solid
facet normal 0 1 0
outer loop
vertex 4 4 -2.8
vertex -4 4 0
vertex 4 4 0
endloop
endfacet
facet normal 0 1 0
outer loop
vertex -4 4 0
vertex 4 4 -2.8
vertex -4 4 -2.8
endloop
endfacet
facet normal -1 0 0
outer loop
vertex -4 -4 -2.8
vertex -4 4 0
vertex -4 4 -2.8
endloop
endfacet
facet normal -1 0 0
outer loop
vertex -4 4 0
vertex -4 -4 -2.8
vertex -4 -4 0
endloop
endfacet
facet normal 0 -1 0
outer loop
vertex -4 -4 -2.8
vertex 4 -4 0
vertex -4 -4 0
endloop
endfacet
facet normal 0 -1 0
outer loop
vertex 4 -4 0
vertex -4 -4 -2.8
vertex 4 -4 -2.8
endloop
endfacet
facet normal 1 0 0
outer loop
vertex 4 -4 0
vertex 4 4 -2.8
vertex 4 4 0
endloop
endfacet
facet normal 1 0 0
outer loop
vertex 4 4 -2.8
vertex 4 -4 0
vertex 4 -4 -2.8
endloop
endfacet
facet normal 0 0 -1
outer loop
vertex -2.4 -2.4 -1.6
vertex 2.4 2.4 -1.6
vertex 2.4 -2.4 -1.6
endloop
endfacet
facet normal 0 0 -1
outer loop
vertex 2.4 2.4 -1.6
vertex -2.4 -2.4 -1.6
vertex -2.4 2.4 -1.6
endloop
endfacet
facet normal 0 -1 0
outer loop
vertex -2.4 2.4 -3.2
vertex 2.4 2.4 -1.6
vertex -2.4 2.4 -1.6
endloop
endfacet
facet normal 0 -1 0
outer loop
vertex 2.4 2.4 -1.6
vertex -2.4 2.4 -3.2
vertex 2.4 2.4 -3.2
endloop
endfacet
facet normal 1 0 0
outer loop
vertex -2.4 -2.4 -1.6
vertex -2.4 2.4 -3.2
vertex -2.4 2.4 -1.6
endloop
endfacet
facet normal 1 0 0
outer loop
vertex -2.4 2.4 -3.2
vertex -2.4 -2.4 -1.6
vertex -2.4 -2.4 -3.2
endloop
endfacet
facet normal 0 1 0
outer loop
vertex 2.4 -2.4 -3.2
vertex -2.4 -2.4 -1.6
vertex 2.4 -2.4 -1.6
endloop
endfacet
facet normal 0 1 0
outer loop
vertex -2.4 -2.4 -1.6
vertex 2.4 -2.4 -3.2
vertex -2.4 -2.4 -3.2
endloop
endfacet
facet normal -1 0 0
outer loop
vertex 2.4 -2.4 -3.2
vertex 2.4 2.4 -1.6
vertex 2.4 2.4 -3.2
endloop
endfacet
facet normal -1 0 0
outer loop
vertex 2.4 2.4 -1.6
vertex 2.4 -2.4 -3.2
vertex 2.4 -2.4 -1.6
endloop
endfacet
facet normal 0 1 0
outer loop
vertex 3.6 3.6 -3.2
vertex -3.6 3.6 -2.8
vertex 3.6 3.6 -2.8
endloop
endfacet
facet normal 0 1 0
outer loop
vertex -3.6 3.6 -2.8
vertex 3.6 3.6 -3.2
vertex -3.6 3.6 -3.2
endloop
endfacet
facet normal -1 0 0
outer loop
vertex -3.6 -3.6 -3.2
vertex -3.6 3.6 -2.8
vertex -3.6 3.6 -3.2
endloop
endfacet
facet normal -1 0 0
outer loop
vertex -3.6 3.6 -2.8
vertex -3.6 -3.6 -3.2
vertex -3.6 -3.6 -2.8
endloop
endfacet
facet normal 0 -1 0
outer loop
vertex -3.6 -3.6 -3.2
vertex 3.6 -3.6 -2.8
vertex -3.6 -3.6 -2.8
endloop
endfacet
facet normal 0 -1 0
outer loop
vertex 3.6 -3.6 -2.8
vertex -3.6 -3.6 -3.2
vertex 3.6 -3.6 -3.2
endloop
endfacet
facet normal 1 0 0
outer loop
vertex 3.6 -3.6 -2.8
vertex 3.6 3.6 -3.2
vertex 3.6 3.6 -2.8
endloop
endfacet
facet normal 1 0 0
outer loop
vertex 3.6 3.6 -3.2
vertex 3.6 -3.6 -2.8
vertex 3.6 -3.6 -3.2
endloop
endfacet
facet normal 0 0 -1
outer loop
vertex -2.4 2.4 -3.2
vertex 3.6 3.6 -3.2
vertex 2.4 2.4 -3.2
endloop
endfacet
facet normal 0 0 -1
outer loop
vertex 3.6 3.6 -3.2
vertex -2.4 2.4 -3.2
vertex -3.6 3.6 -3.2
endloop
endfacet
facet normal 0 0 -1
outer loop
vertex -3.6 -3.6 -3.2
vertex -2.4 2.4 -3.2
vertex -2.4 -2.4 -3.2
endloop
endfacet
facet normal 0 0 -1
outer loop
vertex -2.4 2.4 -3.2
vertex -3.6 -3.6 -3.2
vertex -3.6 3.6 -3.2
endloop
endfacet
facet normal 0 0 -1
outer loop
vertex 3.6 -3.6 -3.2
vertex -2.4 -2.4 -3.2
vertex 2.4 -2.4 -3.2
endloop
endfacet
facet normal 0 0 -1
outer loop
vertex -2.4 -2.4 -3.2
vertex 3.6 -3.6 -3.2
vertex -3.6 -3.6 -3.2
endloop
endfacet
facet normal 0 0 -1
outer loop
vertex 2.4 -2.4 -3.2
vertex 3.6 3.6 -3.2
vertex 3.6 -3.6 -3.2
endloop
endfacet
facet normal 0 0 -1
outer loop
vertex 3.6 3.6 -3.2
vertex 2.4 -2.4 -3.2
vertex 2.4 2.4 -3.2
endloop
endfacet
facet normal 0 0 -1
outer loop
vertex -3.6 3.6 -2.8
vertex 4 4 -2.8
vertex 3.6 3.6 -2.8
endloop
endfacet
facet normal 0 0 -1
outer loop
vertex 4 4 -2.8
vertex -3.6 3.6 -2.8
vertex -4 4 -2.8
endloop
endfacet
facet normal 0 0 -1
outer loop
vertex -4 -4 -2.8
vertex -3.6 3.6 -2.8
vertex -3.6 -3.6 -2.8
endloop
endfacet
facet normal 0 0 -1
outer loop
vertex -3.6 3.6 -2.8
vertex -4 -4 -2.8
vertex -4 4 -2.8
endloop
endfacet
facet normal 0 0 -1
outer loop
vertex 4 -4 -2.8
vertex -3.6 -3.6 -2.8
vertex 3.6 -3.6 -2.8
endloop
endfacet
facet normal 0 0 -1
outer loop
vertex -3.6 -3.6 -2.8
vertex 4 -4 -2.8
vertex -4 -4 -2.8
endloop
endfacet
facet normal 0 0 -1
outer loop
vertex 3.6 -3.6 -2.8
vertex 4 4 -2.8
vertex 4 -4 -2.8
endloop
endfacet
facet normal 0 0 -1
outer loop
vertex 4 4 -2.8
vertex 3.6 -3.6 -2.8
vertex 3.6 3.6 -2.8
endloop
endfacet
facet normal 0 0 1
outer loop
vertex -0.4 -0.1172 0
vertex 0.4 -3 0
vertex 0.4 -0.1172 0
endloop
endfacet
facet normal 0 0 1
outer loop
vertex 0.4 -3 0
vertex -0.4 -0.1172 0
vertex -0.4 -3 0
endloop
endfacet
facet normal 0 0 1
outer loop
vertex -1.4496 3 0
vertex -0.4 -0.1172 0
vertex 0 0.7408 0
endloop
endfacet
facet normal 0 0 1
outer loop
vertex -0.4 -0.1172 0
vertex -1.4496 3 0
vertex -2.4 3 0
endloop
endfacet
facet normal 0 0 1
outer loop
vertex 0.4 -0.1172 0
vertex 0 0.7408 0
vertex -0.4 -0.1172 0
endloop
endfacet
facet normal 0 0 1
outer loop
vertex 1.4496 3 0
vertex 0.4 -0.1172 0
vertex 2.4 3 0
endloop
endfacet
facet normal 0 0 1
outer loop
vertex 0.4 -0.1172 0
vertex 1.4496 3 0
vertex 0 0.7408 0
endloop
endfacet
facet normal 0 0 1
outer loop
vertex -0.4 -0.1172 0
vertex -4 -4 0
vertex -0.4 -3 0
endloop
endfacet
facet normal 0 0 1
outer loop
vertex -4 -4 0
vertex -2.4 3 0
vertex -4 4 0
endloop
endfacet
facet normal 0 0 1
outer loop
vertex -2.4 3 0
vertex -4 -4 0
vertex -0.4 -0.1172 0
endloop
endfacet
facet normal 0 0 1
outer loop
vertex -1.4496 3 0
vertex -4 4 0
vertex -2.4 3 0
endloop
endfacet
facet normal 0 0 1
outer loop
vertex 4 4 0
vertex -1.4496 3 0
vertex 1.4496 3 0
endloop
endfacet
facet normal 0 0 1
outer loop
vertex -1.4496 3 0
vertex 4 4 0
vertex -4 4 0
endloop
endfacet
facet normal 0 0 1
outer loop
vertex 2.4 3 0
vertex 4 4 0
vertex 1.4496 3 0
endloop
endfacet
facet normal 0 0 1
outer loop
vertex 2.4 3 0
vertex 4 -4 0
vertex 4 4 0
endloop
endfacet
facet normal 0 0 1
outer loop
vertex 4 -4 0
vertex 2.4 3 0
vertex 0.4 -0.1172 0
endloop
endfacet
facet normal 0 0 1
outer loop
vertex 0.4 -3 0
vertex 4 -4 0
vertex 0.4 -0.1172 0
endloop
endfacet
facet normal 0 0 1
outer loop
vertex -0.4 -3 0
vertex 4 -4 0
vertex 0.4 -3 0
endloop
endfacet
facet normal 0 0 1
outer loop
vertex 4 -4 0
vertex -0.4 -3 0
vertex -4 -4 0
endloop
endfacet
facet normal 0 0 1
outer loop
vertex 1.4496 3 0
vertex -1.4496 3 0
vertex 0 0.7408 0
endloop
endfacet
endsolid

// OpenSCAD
// file: ../p/box5.scad
use <../lib.scad>
function ldraw_lib__box5() = [
// 0 Box with 5 Faces and All Edges
// 0 Name: box5.dat
// 0 Author: James Jessiman
// 0 !LDRAW_ORG Primitive UPDATE 2012-01
// 0 !LICENSE Licensed under CC BY 2.0 and CC BY 4.0 : see CAreadme.txt
// 
// 0 BFC CERTIFY CCW
  [0,"BFC","CERTIFY"],
  [0,"BFC","CCW"],
// 
// 0 !HISTORY 2002-04-03 [sbliss] Modified for BFC compliance
// 0 !HISTORY 2002-04-25 [PTadmin] Official Update 2002-02
// 0 !HISTORY 2007-06-24 [PTadmin] Header formatted for Contributor Agreement
// 0 !HISTORY 2008-07-01 [PTadmin] Official Update 2008-01
// 0 !HISTORY 2012-02-16 [Philo] Changed to CCW
// 0 !HISTORY 2012-03-30 [PTadmin] Official Update 2012-01
// 
// 
// 2 24 1 1 1 -1 1 1
  [2,24,1,1,1,-1,1,1],
// 2 24 -1 1 1 -1 1 -1
  [2,24,-1,1,1,-1,1,-1],
// 2 24 -1 1 -1 1 1 -1
  [2,24,-1,1,-1,1,1,-1],
// 2 24 1 1 -1 1 1 1
  [2,24,1,1,-1,1,1,1],
// 2 24 1 0 1 -1 0 1
  [2,24,1,0,1,-1,0,1],
// 2 24 -1 0 1 -1 0 -1
  [2,24,-1,0,1,-1,0,-1],
// 2 24 -1 0 -1 1 0 -1
  [2,24,-1,0,-1,1,0,-1],
// 2 24 1 0 -1 1 0 1
  [2,24,1,0,-1,1,0,1],
// 2 24 1 0 1 1 1 1
  [2,24,1,0,1,1,1,1],
// 2 24 -1 0 1 -1 1 1
  [2,24,-1,0,1,-1,1,1],
// 2 24 1 0 -1 1 1 -1
  [2,24,1,0,-1,1,1,-1],
// 2 24 -1 0 -1 -1 1 -1
  [2,24,-1,0,-1,-1,1,-1],
// 4 16 -1 1 1 1 1 1 1 1 -1 -1 1 -1
  [4,16,-1,1,1,1,1,1,1,1,-1,-1,1,-1],
// 4 16 -1 1 1 -1 0 1 1 0 1 1 1 1
  [4,16,-1,1,1,-1,0,1,1,0,1,1,1,1],
// 4 16 -1 1 -1 -1 0 -1 -1 0 1 -1 1 1
  [4,16,-1,1,-1,-1,0,-1,-1,0,1,-1,1,1],
// 4 16 1 1 -1 1 0 -1 -1 0 -1 -1 1 -1
  [4,16,1,1,-1,1,0,-1,-1,0,-1,-1,1,-1],
// 4 16 1 1 1 1 0 1 1 0 -1 1 1 -1
  [4,16,1,1,1,1,0,1,1,0,-1,1,1,-1],
];
makepoly(ldraw_lib__box5(), line=0.2);
// file: ../p/box4.scad
use <../lib.scad>
function ldraw_lib__box4() = [
// 0 Box with 4 Faces (2 Parallel Pairs) and All Edges
// 0 Name: box4.dat
// 0 Author: James Jessiman
// 0 !LDRAW_ORG Primitive UPDATE 2012-01
// 0 !LICENSE Licensed under CC BY 2.0 and CC BY 4.0 : see CAreadme.txt
// 
// 0 BFC CERTIFY CCW
  [0,"BFC","CERTIFY"],
  [0,"BFC","CCW"],
// 
// 0 !HISTORY 2002-04-03 [sbliss] Modified for BFC compliance
// 0 !HISTORY 2002-04-25 [PTadmin] Official Update 2002-02
// 0 !HISTORY 2007-06-24 [PTadmin] Header formatted for Contributor Agreement
// 0 !HISTORY 2008-07-01 [PTadmin] Official Update 2008-01
// 0 !HISTORY 2012-02-16 [Philo] Changed to CCW
// 0 !HISTORY 2012-03-30 [PTadmin] Official Update 2012-01
// 
// 
// 2 24 1 1 1 -1 1 1
  [2,24,1,1,1,-1,1,1],
// 2 24 -1 1 1 -1 1 -1
  [2,24,-1,1,1,-1,1,-1],
// 2 24 -1 1 -1 1 1 -1
  [2,24,-1,1,-1,1,1,-1],
// 2 24 1 1 -1 1 1 1
  [2,24,1,1,-1,1,1,1],
// 2 24 1 0 1 -1 0 1
  [2,24,1,0,1,-1,0,1],
// 2 24 -1 0 1 -1 0 -1
  [2,24,-1,0,1,-1,0,-1],
// 2 24 -1 0 -1 1 0 -1
  [2,24,-1,0,-1,1,0,-1],
// 2 24 1 0 -1 1 0 1
  [2,24,1,0,-1,1,0,1],
// 2 24 1 0 1 1 1 1
  [2,24,1,0,1,1,1,1],
// 2 24 -1 0 1 -1 1 1
  [2,24,-1,0,1,-1,1,1],
// 2 24 1 0 -1 1 1 -1
  [2,24,1,0,-1,1,1,-1],
// 2 24 -1 0 -1 -1 1 -1
  [2,24,-1,0,-1,-1,1,-1],
// 4 16 -1 1 1 -1 0 1 1 0 1 1 1 1
  [4,16,-1,1,1,-1,0,1,1,0,1,1,1,1],
// 4 16 -1 1 -1 -1 0 -1 -1 0 1 -1 1 1
  [4,16,-1,1,-1,-1,0,-1,-1,0,1,-1,1,1],
// 4 16 1 1 -1 1 0 -1 -1 0 -1 -1 1 -1
  [4,16,1,1,-1,1,0,-1,-1,0,-1,-1,1,-1],
// 4 16 1 1 1 1 0 1 1 0 -1 1 1 -1
  [4,16,1,1,1,1,0,1,1,0,-1,1,1,-1],
];
makepoly(ldraw_lib__box4(), line=0.2);
// file: s/3070bs01.scad
use <../../lib.scad>
use <../../p/box4.scad>
use <../../p/box5.scad>
function ldraw_lib__s__3070bs01() = [
// 0 ~Tile  1 x  1 with Groove without Top Face
// 0 Name: s\3070bs01.dat
// 0 Author: Chris Dee [cwdee]
// 0 !LDRAW_ORG Subpart UPDATE 2009-02
// 0 !LICENSE Licensed under CC BY 2.0 and CC BY 4.0 : see CAreadme.txt
// 
// 0 BFC CERTIFY CCW
  [0,"BFC","CERTIFY"],
  [0,"BFC","CCW"],
// 
// 0 !HISTORY 2009-09-03 [PTadmin] Official Update 2009-02
// 
// 
// 1 16 0 0 0 10 0 0 0 7 0 0 0 10 box4.dat
  [1,16,0,0,0,10,0,0,0,7,0,0,0,10, ldraw_lib__box4()],
// 0 BFC INVERTNEXT
  [0,"BFC","INVERTNEXT"],
// 1 16 0 8 0 6 0 0 0 -4 0 0 0 6 box5.dat
  [1,16,0,8,0,6,0,0,0,-4,0,0,0,6, ldraw_lib__box5()],
// 1 16 0 7 0 9 0 0 0 1 0 0 0 9 box4.dat
  [1,16,0,7,0,9,0,0,0,1,0,0,0,9, ldraw_lib__box4()],
// 
// 4 16 9 8 9 6 8 6 -6 8 6 -9 8 9
  [4,16,9,8,9,6,8,6,-6,8,6,-9,8,9],
// 4 16 -9 8 9 -6 8 6 -6 8 -6 -9 8 -9
  [4,16,-9,8,9,-6,8,6,-6,8,-6,-9,8,-9],
// 4 16 -9 8 -9 -6 8 -6 6 8 -6 9 8 -9
  [4,16,-9,8,-9,-6,8,-6,6,8,-6,9,8,-9],
// 4 16 9 8 -9 6 8 -6 6 8 6 9 8 9
  [4,16,9,8,-9,6,8,-6,6,8,6,9,8,9],
// 
// 4 16 10 7 10 9 7 9 -9 7 9 -10 7 10
  [4,16,10,7,10,9,7,9,-9,7,9,-10,7,10],
// 4 16 -10 7 10 -9 7 9 -9 7 -9 -10 7 -10
  [4,16,-10,7,10,-9,7,9,-9,7,-9,-10,7,-10],
// 4 16 -10 7 -10 -9 7 -9 9 7 -9 10 7 -10
  [4,16,-10,7,-10,-9,7,-9,9,7,-9,10,7,-10],
// 4 16 10 7 -10 9 7 -9 9 7 9 10 7 10
  [4,16,10,7,-10,9,7,-9,9,7,9,10,7,10],
// 0
];
makepoly(ldraw_lib__s__3070bs01(), line=0.2);
// file: s/3070baty.scad
use <../../lib.scad>
function ldraw_lib__s__3070baty() = [
// 0 ~Tile  1 x  1 with "Y" Pattern
// 0 Name: s\3070baty.dat
// 0 Author: Chris Dee [cwdee]
// 0 !LDRAW_ORG Subpart UPDATE 2009-01
// 0 !LICENSE Licensed under CC BY 2.0 and CC BY 4.0 : see CAreadme.txt
// 
// 0 BFC CERTIFY CW
  [0,"BFC","CERTIFY"],
  [0,"BFC","CW"],
// 
// 0 !HISTORY 2009-05-02 [PTadmin] Official Update 2009-01
// 
// 
// 4 16 -1 0 -7.5 -1 0 -0.293 1 0 -0.293 1 0 -7.5
  [4,16,-1,0,-7.5,-1,0,-0.293,1,0,-0.293,1,0,-7.5],
// 4 16 -1 0 -0.293 -6 0 7.5 -3.624 0 7.5 0 0 1.852
  [4,16,-1,0,-0.293,-6,0,7.5,-3.624,0,7.5,0,0,1.852],
// 3 16 -1 0 -0.293 0 0 1.852 1 0 -0.293
  [3,16,-1,0,-0.293,0,0,1.852,1,0,-0.293],
// 4 16 3.624 0 7.5 6 0 7.5 1 0 -0.293 0 0 1.852
  [4,16,3.624,0,7.5,6,0,7.5,1,0,-0.293,0,0,1.852],
// 0
];
makepoly(ldraw_lib__s__3070baty(), line=0.2);
// main file
use <../lib.scad>
use <s/3070baty.scad>
use <s/3070bs01.scad>
function ldraw_lib__3070bpty() = [
// 0 Tile  1 x  1 with Silver "Y" Pattern
// 0 Name: 3070bpty.dat
// 0 Author: Chris Dee [cwdee]
// 0 !LDRAW_ORG Part UPDATE 2013-01
// 0 !LICENSE Licensed under CC BY 2.0 and CC BY 4.0 : see CAreadme.txt
// 
// 0 BFC CERTIFY CW
  [0,"BFC","CERTIFY"],
  [0,"BFC","CW"],
// 
// 0 !HISTORY 2009-05-02 [PTadmin] Official Update 2009-01
// 0 !HISTORY 2013-03-09 [MagFors] Changed colour 383 to 80 (printed silver)
// 0 !HISTORY 2013-03-09 [MagFors] Removed overlapping surface
// 0 !HISTORY 2013-07-21 [PTadmin] Official Update 2013-01
// 
// 
// 1 16 0 0 0 1 0 0 0 1 0 0 0 1 s\3070bs01.dat
  [1,16,0,0,0,1,0,0,0,1,0,0,0,1, ldraw_lib__s__3070bs01()],
// 1 80 0 0 0 1 0 0 0 1 0 0 0 1 s\3070baty.dat
  [1,80,0,0,0,1,0,0,0,1,0,0,0,1, ldraw_lib__s__3070baty()],
// 3 16 -1 0 -7.5 -10 0 -10 -1 0 -0.293
  [3,16,-1,0,-7.5,-10,0,-10,-1,0,-0.293],
// 4 16 -1 0 -0.293 -10 0 -10 -10 0 10 -6 0 7.5
  [4,16,-1,0,-0.293,-10,0,-10,-10,0,10,-6,0,7.5],
// 3 16 -6 0 7.5 -10 0 10 -3.624 0 7.5
  [3,16,-6,0,7.5,-10,0,10,-3.624,0,7.5],
// 4 16 -3.624 0 7.5 -10 0 10 10 0 10 3.624 0 7.5
  [4,16,-3.624,0,7.5,-10,0,10,10,0,10,3.624,0,7.5],
// 3 16 3.624 0 7.5 10 0 10 6 0 7.5
  [3,16,3.624,0,7.5,10,0,10,6,0,7.5],
// 4 16 6 0 7.5 10 0 10 10 0 -10 1 0 -0.293
  [4,16,6,0,7.5,10,0,10,10,0,-10,1,0,-0.293],
// 3 16 1 0 -0.293 10 0 -10 1 0 -7.5
  [3,16,1,0,-0.293,10,0,-10,1,0,-7.5],
// 4 16 1 0 -7.5 10 0 -10 -10 0 -10 -1 0 -7.5
  [4,16,1,0,-7.5,10,0,-10,-10,0,-10,-1,0,-7.5],
// 3 16 0 0 1.852 -3.624 0 7.5 3.624 0 7.5
  [3,16,0,0,1.852,-3.624,0,7.5,3.624,0,7.5],
// 
];
makepoly(ldraw_lib__3070bpty(), line=0.2);
